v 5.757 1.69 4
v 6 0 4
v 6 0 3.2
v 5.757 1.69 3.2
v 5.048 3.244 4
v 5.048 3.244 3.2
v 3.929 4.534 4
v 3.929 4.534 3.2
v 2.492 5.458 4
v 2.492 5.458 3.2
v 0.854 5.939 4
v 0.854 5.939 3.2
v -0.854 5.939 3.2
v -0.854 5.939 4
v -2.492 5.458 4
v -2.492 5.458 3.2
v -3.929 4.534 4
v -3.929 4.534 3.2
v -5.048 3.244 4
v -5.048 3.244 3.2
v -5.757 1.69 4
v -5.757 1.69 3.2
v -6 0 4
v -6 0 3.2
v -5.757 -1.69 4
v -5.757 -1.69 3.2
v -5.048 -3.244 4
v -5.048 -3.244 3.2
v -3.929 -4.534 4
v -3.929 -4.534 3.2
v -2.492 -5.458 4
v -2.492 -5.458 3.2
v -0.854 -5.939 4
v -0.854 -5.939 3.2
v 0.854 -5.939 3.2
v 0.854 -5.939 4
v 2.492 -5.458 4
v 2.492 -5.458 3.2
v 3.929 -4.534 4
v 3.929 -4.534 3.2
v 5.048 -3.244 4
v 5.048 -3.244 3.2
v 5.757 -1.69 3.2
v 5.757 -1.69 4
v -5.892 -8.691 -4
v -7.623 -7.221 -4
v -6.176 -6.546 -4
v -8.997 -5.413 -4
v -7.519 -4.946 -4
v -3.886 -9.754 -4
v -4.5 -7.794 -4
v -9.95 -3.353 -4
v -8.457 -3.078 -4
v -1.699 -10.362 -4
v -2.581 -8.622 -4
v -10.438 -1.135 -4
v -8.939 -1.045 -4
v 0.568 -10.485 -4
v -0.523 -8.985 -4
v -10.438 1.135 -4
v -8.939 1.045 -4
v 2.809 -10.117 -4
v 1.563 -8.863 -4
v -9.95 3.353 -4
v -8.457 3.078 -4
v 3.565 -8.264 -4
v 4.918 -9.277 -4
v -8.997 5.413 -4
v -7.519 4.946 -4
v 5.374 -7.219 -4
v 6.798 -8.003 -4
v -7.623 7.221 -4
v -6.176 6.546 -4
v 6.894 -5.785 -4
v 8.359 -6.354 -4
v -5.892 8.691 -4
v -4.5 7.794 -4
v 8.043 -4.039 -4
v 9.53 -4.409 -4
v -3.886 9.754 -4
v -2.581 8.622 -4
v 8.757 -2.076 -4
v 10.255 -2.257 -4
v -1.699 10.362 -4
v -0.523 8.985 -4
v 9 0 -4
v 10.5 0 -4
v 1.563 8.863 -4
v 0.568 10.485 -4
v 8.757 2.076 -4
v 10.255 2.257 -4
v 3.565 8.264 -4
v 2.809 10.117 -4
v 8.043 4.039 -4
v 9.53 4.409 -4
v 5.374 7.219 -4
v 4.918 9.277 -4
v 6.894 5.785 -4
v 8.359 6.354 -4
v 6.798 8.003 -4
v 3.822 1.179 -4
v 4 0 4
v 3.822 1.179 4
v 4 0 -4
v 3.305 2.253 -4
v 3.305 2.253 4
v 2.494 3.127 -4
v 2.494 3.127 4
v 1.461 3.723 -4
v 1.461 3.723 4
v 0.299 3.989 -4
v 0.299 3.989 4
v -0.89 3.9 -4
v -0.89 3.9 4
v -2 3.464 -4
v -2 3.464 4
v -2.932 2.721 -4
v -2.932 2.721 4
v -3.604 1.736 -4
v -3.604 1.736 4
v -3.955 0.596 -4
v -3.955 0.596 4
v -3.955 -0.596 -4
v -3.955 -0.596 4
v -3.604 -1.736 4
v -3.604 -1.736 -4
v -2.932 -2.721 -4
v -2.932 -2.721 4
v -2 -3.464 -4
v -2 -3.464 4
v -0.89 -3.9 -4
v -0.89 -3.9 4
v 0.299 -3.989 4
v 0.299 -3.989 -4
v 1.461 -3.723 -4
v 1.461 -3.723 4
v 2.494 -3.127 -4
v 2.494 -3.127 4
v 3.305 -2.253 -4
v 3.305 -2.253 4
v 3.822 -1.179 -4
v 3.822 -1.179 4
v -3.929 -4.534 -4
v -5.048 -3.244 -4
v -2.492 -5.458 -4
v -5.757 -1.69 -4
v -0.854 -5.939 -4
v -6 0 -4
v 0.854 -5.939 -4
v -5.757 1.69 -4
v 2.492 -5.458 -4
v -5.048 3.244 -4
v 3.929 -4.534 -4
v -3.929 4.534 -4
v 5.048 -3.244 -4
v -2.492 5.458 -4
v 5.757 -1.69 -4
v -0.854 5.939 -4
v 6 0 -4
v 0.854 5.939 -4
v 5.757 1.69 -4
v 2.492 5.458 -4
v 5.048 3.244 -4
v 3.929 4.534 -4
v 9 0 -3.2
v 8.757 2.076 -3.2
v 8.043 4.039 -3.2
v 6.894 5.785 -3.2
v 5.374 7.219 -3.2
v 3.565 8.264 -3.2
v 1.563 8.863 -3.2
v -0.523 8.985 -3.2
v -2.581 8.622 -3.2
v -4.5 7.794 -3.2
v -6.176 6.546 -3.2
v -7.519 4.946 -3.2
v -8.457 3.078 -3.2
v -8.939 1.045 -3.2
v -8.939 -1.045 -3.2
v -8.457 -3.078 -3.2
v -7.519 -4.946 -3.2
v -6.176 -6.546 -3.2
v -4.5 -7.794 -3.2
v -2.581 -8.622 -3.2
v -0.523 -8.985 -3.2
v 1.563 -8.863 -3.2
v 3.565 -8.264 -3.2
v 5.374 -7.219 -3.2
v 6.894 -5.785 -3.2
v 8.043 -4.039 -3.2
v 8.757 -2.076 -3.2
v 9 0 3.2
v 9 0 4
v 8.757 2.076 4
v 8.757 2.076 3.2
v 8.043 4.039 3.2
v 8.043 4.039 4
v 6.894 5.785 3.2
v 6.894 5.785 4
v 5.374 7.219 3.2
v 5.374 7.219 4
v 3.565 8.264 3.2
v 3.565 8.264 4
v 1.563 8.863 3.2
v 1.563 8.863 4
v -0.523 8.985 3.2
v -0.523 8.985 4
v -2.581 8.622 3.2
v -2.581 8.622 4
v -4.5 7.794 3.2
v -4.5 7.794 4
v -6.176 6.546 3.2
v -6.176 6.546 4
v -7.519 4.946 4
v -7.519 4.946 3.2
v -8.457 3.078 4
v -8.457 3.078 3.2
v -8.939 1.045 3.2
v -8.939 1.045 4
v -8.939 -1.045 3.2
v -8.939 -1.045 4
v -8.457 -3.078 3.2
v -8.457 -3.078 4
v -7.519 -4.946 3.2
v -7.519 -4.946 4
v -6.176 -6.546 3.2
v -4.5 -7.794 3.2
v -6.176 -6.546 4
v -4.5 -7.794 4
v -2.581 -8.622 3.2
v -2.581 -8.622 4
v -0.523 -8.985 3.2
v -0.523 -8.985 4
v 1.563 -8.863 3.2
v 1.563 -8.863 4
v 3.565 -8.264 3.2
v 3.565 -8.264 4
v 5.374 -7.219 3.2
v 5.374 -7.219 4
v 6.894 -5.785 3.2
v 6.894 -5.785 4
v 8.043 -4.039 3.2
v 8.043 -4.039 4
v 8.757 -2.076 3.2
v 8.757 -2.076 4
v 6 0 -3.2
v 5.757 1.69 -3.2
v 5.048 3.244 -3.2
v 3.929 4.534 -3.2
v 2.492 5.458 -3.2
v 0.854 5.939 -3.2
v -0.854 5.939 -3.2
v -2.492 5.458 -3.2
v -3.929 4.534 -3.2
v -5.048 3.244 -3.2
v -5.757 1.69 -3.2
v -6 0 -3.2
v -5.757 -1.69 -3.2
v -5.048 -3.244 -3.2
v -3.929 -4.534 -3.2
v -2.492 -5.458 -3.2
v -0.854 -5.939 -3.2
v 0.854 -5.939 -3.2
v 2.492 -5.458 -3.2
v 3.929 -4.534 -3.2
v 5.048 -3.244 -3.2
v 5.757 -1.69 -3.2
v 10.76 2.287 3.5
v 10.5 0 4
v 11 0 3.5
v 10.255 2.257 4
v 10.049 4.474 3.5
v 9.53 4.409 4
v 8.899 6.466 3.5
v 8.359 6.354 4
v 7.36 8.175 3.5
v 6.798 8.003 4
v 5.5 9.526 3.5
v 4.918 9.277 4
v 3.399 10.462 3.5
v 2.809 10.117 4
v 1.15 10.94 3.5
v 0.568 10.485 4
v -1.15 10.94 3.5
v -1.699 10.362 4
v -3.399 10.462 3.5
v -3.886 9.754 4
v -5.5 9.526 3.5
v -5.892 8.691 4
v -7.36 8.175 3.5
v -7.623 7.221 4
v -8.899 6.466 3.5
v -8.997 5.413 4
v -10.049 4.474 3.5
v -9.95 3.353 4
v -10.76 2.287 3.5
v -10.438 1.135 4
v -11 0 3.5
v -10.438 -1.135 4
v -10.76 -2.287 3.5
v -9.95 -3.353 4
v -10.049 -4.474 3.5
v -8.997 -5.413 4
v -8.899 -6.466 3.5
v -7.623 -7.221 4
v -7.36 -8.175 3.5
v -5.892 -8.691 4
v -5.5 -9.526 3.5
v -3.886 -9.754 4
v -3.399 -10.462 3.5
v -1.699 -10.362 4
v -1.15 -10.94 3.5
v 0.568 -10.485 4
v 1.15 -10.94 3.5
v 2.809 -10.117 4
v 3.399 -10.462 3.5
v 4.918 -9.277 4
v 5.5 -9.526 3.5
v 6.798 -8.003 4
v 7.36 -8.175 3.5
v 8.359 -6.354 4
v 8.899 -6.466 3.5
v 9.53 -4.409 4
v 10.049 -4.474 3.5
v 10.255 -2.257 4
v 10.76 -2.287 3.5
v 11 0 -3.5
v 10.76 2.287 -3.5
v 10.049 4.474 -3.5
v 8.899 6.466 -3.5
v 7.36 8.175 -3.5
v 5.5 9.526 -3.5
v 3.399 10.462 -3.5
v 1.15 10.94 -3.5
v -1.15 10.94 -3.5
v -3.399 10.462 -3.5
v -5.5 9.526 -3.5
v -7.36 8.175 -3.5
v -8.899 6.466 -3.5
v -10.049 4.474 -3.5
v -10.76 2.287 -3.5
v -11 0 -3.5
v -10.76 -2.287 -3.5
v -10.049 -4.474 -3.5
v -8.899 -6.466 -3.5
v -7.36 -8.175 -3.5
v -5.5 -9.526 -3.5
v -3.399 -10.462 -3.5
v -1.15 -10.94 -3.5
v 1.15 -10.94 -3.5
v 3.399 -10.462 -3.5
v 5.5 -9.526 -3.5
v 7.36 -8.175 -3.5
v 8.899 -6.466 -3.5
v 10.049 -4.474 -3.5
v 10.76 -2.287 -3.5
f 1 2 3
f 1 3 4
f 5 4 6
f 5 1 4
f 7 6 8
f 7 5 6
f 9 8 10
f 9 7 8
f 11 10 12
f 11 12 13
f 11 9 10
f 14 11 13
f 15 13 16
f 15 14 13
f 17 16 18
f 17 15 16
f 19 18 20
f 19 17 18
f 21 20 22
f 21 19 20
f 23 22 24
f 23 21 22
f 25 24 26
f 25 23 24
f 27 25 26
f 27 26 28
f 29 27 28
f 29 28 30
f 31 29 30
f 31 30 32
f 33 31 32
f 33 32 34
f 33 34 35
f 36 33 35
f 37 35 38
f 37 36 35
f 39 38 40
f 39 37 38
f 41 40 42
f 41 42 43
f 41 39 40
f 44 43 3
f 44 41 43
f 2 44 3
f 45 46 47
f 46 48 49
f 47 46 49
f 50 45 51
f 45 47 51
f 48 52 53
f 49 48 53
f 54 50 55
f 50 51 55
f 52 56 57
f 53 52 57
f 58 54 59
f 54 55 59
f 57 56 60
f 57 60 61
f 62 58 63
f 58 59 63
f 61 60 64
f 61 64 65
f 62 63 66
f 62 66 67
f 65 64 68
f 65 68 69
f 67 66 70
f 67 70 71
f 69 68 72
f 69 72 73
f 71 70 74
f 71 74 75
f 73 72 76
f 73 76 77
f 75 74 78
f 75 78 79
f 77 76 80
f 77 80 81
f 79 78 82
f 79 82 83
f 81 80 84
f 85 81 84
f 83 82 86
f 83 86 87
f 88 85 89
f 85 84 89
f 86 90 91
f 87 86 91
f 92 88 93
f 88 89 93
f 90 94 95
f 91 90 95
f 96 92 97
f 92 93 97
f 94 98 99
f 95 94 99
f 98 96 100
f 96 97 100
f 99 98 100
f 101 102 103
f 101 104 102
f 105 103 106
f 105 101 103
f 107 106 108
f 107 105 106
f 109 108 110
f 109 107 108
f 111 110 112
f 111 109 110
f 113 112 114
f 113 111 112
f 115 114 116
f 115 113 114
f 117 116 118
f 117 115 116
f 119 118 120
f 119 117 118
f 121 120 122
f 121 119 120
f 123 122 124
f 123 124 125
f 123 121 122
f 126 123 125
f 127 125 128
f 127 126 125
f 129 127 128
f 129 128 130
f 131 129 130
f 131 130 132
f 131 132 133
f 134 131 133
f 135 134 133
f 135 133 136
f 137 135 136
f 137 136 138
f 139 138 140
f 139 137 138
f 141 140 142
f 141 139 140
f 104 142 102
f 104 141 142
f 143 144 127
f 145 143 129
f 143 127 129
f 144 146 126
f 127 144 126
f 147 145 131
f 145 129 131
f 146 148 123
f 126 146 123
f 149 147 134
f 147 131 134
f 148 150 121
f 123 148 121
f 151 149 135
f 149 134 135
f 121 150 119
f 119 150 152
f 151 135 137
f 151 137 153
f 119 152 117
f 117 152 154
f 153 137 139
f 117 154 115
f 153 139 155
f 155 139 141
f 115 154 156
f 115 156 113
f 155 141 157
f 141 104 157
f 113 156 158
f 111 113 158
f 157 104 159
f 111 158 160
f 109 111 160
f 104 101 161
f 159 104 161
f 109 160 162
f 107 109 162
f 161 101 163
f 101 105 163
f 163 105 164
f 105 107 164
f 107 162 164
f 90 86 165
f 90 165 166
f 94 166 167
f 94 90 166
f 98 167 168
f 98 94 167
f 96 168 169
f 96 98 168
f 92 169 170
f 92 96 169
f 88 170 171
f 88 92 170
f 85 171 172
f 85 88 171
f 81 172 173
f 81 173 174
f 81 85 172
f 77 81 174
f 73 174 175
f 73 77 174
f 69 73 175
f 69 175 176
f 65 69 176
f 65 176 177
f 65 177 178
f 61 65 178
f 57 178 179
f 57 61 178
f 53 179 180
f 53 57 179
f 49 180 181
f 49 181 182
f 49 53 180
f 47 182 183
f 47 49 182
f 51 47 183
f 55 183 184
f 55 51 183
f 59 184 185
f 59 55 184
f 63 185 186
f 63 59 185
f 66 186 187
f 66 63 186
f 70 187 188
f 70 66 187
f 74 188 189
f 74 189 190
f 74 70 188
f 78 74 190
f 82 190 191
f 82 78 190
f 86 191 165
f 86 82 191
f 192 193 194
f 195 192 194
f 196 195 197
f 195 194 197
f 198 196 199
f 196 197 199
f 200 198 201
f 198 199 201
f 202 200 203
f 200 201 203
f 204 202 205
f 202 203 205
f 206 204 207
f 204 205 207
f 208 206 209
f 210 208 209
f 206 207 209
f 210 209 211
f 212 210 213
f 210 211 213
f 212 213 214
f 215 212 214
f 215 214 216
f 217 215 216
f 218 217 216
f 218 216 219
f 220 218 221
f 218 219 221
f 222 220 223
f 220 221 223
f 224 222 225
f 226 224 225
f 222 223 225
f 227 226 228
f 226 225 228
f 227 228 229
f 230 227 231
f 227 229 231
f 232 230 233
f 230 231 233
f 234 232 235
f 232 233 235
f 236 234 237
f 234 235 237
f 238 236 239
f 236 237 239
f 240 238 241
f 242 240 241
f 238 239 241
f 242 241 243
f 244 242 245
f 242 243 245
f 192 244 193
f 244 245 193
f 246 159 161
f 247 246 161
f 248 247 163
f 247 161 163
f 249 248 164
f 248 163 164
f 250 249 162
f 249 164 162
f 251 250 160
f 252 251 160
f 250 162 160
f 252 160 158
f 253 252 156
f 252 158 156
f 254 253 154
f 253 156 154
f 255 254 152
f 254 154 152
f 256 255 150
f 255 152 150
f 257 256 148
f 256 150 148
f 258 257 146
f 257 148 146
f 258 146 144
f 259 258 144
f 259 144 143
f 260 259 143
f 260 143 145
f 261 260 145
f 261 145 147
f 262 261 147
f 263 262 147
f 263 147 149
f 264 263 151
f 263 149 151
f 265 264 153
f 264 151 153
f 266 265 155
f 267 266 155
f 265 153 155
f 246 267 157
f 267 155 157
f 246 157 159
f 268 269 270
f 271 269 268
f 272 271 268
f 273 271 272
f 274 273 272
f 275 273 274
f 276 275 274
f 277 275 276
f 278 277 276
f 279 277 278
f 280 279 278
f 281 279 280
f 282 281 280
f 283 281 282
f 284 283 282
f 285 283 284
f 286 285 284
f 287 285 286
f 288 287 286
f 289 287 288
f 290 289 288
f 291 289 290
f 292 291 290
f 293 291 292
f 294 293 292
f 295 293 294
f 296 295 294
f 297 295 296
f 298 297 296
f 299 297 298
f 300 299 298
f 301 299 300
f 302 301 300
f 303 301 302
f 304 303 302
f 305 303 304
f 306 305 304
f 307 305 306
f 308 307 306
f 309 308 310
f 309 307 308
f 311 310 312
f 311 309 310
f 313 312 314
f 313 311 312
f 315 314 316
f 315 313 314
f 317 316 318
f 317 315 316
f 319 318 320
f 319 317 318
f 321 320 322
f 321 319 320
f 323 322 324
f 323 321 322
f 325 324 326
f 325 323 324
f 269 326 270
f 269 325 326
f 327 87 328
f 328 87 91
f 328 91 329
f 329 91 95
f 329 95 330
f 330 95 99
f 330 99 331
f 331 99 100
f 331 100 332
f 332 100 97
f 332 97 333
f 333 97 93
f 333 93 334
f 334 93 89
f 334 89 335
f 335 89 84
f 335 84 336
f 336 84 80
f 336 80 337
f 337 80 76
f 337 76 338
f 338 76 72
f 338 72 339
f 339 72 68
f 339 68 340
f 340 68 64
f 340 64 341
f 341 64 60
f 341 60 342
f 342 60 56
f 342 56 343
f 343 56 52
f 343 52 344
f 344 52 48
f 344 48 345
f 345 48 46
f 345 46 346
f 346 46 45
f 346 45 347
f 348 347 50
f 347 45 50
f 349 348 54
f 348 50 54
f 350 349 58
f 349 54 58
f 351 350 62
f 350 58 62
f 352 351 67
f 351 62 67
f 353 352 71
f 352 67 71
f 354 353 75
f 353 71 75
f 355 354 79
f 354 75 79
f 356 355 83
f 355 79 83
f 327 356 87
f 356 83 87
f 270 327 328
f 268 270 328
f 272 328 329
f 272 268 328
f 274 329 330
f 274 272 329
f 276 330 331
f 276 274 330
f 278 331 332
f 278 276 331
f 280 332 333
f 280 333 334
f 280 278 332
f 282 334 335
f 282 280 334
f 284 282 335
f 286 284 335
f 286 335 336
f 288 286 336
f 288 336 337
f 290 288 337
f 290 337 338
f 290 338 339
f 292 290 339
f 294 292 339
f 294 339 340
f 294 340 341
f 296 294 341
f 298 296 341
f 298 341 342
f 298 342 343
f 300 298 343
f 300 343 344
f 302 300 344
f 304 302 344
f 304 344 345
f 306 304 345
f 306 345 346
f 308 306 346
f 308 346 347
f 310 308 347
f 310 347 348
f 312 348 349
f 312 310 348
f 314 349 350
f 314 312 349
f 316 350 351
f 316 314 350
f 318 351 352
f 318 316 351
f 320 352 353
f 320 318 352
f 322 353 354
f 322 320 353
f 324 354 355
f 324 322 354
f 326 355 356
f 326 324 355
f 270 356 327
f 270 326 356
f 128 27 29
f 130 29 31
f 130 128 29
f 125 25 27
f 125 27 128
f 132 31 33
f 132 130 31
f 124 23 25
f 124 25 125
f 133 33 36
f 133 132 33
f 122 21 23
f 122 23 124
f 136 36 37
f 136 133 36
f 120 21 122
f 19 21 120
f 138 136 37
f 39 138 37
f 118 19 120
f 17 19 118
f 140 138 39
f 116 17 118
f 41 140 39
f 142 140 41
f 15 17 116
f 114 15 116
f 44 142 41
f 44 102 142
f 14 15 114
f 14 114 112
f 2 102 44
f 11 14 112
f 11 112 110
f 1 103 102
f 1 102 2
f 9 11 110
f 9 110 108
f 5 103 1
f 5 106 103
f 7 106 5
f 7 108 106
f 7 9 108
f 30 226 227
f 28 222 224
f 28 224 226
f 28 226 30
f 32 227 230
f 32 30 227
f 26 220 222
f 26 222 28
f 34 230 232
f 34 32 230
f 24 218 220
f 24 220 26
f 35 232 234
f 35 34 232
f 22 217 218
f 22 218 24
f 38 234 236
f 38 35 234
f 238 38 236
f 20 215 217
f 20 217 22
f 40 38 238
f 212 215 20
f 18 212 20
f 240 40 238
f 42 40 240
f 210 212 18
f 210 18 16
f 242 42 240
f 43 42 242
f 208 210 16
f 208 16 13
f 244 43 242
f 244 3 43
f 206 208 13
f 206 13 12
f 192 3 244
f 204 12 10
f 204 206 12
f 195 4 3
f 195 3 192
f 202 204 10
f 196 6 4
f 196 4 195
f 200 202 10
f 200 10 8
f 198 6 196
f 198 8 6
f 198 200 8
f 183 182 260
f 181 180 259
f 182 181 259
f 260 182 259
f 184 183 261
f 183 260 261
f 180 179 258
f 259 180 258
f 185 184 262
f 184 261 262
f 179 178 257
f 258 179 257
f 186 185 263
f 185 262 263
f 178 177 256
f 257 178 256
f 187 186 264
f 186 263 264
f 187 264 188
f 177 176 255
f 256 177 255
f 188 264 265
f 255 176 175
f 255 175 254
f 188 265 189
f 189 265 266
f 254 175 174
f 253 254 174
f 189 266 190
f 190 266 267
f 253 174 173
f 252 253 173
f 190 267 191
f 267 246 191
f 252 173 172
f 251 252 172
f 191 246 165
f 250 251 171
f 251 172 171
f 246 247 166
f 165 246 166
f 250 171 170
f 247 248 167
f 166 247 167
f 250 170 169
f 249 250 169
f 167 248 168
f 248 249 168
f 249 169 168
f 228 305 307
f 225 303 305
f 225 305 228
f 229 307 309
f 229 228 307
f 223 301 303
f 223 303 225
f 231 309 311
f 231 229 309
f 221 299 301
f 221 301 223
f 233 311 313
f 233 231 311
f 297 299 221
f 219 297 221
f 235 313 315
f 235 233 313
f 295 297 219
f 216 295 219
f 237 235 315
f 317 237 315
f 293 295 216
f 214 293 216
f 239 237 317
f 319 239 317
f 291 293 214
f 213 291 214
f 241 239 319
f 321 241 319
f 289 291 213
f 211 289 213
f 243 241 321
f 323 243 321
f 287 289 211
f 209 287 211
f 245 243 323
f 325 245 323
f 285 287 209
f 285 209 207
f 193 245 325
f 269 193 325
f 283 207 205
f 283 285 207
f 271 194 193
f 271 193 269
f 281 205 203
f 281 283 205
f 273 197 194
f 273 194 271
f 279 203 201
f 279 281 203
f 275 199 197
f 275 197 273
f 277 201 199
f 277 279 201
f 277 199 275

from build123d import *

# Parameters (mm, degrees)
F0_R     = 11
F0_R_2   = 4
F1_DEPTH = 4
F2_R     = 9
F2_R_2   = 6
F3_DEPTH = 0.8
F4_SIZE  = 0.5


# Not quite as in the source:
# - a pattern or mirror of a feature is missing from the dataset's text; its kind, count and spacing are read off the source's solid


with BuildPart() as f1:
    # F0 (on Top) → F1 (new body, symmetric)
    with BuildSketch(Plane.XY):
        Circle(F0_R)
        Circle(F0_R_2, mode=Mode.SUBTRACT)
    extrude(amount=F1_DEPTH, both=True)

    # F2 (on face) → F3 (cut)
    with BuildSketch(Plane.XY.offset(4)):
        Circle(F2_R)
        Circle(F2_R_2, mode=Mode.SUBTRACT)
    f3 = extrude(amount=-F3_DEPTH, mode=Mode.SUBTRACT)

    # F3_copies: F3 across plane
    add(f3.mirror(Plane(origin=(0, 0, 0), x_dir=(-1, 0, 0), z_dir=(0, 0, -1))), mode=Mode.SUBTRACT)

    # F4
    f4_edges = [f1.edges().sort_by_distance(p)[0] for p in [
        (-11, 0, 4),
        (-11, 0, -4),
    ]]
    chamfer(f4_edges, length=F4_SIZE)


solid = f1.part
